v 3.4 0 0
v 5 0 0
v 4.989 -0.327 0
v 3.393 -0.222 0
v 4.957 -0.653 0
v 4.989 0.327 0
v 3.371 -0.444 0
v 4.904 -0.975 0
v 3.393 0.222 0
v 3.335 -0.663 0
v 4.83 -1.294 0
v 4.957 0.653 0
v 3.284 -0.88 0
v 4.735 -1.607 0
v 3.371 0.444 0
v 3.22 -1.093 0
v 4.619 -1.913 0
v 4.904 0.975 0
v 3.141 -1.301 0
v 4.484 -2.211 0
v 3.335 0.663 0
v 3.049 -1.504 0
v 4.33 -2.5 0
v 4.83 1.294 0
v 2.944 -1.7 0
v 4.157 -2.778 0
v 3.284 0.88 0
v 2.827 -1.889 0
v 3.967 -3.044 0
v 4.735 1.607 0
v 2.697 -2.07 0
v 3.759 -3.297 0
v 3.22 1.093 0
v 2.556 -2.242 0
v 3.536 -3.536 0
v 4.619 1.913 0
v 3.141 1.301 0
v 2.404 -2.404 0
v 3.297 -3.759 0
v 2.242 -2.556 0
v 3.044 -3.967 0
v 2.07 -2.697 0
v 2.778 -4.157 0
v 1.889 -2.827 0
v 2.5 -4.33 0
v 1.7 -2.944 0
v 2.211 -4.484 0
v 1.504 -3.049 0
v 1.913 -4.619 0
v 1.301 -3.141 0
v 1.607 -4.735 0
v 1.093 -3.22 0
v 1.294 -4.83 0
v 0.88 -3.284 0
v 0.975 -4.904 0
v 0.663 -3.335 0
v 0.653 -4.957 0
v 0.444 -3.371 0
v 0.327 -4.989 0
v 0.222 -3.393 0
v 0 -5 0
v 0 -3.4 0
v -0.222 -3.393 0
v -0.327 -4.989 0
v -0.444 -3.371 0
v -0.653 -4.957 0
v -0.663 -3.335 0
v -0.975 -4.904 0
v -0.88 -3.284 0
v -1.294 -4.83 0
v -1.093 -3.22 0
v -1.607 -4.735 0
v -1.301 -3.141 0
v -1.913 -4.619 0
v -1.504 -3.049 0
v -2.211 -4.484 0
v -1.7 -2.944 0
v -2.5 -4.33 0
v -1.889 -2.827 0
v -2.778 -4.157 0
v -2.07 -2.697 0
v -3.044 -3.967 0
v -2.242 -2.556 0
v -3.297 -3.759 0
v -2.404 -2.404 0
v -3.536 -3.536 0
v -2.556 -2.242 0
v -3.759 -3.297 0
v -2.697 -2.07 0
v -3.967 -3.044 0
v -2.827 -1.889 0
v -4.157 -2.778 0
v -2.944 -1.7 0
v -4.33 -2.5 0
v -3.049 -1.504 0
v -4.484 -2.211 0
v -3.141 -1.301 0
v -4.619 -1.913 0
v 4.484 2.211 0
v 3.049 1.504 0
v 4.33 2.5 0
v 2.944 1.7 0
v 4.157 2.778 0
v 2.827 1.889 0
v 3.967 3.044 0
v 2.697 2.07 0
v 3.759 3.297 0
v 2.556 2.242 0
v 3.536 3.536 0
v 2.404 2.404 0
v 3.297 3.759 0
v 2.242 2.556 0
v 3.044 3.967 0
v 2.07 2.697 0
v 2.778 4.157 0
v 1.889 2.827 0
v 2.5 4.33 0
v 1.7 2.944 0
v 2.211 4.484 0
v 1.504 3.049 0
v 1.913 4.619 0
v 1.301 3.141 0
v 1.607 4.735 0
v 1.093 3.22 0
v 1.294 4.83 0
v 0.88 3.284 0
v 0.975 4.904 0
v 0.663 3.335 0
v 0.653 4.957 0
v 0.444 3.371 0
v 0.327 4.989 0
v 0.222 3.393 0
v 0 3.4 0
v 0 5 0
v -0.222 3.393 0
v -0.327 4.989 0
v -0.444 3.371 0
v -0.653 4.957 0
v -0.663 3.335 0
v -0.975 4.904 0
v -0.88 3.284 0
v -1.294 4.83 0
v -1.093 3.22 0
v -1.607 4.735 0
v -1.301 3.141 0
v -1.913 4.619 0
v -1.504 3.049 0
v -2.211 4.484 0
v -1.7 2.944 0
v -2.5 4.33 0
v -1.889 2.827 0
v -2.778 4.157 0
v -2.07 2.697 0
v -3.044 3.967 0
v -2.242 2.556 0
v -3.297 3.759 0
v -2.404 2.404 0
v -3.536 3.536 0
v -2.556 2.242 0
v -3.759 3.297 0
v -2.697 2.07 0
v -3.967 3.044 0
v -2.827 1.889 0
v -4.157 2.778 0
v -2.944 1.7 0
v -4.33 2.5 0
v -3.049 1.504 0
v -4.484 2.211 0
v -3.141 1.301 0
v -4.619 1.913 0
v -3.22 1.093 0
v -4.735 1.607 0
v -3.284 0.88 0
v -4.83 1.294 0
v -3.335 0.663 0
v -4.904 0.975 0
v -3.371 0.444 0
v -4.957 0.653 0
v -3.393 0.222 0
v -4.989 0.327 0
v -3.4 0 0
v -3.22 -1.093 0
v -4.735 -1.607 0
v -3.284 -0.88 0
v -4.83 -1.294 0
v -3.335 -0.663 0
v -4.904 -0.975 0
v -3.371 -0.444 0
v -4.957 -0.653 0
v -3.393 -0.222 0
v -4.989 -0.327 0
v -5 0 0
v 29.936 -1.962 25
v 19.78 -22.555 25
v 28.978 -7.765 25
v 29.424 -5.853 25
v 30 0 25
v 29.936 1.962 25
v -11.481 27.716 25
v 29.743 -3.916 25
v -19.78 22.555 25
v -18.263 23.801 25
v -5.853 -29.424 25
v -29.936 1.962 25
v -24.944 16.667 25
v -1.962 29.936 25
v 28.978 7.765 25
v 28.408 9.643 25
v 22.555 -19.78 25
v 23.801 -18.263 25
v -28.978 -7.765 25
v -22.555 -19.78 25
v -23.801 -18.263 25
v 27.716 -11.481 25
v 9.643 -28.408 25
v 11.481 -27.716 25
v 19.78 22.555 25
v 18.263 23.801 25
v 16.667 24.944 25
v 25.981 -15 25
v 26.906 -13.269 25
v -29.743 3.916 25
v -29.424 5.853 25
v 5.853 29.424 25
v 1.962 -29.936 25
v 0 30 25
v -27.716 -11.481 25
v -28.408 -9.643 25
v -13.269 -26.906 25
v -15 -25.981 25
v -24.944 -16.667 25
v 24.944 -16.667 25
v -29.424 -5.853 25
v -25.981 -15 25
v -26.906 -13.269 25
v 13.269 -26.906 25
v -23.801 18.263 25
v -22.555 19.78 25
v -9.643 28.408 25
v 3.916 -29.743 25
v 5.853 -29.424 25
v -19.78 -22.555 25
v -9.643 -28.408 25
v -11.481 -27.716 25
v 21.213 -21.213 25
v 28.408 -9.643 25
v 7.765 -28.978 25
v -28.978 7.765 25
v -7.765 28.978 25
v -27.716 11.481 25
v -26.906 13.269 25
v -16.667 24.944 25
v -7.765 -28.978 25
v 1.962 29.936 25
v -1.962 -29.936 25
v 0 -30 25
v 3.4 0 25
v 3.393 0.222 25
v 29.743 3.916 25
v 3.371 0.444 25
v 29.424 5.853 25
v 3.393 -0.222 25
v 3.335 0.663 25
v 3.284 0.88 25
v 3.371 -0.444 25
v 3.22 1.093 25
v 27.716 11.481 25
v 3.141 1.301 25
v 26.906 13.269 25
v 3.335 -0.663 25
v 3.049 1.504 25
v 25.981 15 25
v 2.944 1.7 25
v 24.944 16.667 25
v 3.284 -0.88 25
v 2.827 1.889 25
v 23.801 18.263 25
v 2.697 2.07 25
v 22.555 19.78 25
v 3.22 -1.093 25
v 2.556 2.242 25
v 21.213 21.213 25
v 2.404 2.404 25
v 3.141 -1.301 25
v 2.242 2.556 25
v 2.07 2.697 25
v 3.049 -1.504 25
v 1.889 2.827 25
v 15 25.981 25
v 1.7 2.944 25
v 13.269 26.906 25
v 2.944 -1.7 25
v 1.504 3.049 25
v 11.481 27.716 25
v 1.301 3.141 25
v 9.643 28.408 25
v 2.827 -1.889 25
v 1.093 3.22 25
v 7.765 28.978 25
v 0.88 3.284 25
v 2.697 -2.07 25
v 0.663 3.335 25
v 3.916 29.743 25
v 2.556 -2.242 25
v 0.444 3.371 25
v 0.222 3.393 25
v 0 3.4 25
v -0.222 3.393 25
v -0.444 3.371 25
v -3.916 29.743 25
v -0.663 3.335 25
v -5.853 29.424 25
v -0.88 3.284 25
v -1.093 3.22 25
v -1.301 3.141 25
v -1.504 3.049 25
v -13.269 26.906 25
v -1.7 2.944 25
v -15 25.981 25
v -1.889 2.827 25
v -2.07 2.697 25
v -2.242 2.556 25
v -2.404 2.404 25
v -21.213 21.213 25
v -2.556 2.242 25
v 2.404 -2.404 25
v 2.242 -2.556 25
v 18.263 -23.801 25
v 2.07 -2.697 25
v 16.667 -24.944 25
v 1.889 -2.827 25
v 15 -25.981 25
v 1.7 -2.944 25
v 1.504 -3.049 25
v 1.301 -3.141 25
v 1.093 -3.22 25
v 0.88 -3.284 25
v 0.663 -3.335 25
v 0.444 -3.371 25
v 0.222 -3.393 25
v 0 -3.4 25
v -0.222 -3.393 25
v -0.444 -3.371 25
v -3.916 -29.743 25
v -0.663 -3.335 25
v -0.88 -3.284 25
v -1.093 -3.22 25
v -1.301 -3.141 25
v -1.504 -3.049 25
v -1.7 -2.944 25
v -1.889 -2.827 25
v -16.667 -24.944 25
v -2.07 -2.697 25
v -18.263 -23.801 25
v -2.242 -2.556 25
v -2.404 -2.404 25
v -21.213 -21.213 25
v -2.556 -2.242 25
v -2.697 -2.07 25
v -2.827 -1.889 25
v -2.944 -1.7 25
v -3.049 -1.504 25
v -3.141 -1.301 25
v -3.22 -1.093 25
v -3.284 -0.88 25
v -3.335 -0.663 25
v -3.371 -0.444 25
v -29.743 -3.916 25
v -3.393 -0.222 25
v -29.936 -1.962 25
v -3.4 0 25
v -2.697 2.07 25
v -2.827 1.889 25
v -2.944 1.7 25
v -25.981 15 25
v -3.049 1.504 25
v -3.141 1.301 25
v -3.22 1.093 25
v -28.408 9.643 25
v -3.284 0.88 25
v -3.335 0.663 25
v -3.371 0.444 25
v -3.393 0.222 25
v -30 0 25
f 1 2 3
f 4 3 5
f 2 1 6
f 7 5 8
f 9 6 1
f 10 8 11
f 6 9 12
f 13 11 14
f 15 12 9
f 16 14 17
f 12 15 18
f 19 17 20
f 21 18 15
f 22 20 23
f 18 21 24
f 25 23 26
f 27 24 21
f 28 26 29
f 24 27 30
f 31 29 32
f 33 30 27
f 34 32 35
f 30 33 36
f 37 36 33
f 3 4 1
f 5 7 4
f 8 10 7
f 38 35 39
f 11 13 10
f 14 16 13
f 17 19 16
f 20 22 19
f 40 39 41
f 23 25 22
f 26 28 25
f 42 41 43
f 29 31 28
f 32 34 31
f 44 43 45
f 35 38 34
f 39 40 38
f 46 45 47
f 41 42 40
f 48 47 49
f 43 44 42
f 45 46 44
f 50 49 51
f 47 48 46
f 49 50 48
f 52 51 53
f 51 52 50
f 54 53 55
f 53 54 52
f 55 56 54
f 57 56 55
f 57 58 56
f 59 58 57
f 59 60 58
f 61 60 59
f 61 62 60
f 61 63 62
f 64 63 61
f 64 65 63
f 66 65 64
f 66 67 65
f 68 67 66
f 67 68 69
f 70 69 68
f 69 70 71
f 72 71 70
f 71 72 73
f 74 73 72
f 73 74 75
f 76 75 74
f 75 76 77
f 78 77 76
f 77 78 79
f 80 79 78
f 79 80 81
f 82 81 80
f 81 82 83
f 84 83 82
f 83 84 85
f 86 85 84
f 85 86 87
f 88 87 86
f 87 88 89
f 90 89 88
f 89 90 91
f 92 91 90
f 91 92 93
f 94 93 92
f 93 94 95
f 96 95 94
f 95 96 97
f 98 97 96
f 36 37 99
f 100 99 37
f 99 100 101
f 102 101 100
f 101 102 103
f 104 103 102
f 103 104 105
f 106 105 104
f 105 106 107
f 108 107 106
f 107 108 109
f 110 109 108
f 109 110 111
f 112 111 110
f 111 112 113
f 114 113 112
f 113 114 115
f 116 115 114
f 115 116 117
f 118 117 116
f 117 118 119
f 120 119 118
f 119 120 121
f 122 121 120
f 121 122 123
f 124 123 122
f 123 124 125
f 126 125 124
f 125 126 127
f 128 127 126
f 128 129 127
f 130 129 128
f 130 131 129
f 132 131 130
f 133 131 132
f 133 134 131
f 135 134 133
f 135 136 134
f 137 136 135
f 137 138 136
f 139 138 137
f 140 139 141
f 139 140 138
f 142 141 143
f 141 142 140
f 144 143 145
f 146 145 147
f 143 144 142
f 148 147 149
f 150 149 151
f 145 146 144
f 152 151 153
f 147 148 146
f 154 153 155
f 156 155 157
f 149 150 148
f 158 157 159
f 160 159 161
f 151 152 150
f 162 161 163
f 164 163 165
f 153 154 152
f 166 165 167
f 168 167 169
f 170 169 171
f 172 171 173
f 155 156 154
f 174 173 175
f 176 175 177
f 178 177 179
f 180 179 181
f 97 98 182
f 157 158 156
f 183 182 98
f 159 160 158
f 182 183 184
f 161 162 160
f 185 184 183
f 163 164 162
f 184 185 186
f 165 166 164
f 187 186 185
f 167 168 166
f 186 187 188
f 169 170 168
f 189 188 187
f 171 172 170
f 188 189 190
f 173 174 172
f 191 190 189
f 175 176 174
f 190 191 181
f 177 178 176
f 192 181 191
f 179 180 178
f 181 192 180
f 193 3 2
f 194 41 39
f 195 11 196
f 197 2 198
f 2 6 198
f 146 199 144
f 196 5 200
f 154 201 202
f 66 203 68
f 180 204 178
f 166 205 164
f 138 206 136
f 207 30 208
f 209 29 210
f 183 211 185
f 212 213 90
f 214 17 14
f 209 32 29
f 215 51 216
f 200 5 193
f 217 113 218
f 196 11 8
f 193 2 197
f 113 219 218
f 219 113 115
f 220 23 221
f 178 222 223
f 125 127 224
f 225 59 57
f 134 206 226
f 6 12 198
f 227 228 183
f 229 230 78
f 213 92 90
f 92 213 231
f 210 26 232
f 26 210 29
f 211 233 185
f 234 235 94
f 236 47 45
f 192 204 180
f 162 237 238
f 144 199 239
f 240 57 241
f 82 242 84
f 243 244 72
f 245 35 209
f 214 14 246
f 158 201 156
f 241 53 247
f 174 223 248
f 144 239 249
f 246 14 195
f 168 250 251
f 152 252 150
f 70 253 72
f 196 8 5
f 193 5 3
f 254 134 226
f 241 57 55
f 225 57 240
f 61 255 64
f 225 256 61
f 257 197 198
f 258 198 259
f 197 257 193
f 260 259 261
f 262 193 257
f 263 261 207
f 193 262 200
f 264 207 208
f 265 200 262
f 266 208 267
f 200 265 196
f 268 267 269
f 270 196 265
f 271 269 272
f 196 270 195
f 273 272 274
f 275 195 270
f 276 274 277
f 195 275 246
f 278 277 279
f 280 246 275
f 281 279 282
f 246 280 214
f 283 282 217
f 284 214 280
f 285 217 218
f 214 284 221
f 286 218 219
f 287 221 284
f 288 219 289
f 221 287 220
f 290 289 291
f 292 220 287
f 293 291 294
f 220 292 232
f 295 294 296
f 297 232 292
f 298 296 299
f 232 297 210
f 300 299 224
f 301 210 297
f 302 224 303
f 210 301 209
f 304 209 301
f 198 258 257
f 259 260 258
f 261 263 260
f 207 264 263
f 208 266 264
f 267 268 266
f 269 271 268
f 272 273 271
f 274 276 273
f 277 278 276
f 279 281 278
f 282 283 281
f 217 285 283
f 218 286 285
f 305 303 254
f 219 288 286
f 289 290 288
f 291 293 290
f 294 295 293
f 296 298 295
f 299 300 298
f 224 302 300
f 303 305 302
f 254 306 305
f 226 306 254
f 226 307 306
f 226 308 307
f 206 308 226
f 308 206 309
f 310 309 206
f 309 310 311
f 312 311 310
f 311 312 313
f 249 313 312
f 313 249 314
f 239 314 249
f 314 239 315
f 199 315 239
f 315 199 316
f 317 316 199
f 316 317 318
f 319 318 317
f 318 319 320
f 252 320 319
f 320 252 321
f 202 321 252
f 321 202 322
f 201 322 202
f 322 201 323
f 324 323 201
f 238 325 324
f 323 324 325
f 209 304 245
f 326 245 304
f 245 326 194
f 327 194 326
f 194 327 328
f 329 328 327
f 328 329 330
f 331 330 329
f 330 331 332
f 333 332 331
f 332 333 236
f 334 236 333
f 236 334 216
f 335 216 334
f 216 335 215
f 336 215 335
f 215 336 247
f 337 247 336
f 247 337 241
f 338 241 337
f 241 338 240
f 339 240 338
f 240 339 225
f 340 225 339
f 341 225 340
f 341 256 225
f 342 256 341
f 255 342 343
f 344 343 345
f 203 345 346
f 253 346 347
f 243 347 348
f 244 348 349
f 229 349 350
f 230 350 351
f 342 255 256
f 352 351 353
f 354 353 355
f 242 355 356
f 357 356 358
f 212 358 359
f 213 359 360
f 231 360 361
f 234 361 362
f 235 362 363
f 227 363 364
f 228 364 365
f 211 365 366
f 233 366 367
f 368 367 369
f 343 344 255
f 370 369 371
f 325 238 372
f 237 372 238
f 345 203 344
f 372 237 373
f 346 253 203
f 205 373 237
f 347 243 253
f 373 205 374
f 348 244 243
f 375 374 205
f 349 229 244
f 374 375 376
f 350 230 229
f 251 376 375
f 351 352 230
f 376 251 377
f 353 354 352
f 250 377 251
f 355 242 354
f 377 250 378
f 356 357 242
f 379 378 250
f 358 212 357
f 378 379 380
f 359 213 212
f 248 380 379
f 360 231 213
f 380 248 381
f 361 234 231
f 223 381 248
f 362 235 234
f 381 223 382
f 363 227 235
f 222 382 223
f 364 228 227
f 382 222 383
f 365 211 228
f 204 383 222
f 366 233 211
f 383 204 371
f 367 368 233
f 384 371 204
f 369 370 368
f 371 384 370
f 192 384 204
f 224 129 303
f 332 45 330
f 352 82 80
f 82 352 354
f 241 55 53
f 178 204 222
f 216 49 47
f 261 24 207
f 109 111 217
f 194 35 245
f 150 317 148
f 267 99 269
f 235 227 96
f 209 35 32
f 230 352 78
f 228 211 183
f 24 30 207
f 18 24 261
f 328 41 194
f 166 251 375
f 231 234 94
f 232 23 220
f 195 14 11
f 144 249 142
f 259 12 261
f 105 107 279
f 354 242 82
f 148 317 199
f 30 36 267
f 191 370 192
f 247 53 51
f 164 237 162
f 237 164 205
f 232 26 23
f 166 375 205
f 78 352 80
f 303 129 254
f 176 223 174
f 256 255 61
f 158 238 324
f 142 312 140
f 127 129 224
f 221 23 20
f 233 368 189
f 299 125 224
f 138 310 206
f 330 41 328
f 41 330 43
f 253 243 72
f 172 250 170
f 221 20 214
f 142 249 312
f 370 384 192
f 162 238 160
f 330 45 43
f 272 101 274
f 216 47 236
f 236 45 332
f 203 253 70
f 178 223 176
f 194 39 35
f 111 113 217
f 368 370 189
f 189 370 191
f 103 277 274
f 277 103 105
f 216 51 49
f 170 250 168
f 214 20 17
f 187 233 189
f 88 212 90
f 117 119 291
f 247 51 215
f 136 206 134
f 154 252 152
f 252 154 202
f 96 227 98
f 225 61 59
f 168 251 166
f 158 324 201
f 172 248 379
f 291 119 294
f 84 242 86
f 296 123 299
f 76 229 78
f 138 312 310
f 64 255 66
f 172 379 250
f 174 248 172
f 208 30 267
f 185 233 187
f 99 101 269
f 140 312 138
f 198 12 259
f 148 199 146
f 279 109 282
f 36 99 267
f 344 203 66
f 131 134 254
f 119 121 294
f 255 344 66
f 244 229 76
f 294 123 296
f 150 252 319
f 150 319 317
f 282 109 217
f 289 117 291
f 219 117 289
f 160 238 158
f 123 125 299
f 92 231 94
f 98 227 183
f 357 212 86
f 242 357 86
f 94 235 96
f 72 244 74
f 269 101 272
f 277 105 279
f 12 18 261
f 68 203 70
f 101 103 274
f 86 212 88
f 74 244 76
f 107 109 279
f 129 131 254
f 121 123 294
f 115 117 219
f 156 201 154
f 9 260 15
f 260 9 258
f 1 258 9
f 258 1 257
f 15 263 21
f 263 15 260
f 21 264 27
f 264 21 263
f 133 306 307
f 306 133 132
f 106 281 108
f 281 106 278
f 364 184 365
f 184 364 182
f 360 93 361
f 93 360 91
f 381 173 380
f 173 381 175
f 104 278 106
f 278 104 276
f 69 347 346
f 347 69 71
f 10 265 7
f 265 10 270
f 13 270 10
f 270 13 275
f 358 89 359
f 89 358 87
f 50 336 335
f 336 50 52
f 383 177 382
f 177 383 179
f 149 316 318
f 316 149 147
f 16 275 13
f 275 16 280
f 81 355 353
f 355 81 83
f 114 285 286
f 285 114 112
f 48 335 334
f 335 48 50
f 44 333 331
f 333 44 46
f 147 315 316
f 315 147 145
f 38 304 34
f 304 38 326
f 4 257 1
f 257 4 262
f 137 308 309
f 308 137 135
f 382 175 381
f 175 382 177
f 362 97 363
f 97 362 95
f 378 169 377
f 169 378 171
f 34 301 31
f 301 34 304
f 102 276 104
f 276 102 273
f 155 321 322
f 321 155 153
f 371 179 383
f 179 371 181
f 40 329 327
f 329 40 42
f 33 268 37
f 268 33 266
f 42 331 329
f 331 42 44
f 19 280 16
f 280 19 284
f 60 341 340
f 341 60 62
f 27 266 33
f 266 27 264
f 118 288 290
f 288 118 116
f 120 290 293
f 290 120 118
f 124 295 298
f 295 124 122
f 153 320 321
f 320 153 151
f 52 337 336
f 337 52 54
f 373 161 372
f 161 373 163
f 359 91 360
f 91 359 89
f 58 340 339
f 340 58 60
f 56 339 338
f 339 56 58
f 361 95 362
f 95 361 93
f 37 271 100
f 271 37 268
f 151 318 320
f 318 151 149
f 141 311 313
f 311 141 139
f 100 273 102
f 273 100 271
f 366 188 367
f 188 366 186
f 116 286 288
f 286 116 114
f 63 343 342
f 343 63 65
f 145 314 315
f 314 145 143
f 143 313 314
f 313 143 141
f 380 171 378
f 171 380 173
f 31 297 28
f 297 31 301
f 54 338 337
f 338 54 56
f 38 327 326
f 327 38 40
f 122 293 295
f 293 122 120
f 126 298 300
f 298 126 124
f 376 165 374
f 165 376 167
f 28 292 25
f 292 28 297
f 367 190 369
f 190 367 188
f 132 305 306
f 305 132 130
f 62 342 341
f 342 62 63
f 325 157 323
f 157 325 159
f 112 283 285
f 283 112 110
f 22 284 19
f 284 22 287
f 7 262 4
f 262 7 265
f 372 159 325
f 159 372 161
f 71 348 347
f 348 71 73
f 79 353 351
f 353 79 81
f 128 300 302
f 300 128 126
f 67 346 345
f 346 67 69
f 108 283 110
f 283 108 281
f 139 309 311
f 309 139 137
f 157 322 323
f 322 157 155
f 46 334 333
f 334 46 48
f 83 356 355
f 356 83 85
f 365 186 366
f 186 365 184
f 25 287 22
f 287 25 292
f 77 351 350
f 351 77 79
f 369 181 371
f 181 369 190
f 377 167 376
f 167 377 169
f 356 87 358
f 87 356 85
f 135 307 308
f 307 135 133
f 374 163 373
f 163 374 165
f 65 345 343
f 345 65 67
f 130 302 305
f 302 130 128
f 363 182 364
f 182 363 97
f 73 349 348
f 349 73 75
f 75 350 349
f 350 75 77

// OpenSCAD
// Small lab funnel - printed upright, open top and bottom
// Units: mm

$fn = 96;

// --- Dimensions ---
spout_od      = 10;    // spout outer diameter
spout_len     = 20;    // spout length (z = 0 to 20)
cone_bottom_d = 10;    // cone outer diameter at z = 20
cone_top_d    = 60;    // cone outer diameter at rim (z = 50)
wall          = 1.6;   // wall thickness everywhere

// --- Derived ---
spout_id = spout_od - 2 * wall;   // bore diameter (6.8 mm)
total_h  = spout_len + (cone_top_d - cone_bottom_d) / 2; // 50 mm

difference() {
    union() {
        // Spout
        cylinder(d = spout_od, h = spout_len);
        // Cone (frustum from bottom_d to top_d over height 30)
        cylinder(d1 = cone_bottom_d, d2 = cone_top_d, h = total_h - spout_len);
    }
    // Through-bore along Z
    translate([0, 0, -1])
        cylinder(d = spout_id, h = total_h + 2);
}
